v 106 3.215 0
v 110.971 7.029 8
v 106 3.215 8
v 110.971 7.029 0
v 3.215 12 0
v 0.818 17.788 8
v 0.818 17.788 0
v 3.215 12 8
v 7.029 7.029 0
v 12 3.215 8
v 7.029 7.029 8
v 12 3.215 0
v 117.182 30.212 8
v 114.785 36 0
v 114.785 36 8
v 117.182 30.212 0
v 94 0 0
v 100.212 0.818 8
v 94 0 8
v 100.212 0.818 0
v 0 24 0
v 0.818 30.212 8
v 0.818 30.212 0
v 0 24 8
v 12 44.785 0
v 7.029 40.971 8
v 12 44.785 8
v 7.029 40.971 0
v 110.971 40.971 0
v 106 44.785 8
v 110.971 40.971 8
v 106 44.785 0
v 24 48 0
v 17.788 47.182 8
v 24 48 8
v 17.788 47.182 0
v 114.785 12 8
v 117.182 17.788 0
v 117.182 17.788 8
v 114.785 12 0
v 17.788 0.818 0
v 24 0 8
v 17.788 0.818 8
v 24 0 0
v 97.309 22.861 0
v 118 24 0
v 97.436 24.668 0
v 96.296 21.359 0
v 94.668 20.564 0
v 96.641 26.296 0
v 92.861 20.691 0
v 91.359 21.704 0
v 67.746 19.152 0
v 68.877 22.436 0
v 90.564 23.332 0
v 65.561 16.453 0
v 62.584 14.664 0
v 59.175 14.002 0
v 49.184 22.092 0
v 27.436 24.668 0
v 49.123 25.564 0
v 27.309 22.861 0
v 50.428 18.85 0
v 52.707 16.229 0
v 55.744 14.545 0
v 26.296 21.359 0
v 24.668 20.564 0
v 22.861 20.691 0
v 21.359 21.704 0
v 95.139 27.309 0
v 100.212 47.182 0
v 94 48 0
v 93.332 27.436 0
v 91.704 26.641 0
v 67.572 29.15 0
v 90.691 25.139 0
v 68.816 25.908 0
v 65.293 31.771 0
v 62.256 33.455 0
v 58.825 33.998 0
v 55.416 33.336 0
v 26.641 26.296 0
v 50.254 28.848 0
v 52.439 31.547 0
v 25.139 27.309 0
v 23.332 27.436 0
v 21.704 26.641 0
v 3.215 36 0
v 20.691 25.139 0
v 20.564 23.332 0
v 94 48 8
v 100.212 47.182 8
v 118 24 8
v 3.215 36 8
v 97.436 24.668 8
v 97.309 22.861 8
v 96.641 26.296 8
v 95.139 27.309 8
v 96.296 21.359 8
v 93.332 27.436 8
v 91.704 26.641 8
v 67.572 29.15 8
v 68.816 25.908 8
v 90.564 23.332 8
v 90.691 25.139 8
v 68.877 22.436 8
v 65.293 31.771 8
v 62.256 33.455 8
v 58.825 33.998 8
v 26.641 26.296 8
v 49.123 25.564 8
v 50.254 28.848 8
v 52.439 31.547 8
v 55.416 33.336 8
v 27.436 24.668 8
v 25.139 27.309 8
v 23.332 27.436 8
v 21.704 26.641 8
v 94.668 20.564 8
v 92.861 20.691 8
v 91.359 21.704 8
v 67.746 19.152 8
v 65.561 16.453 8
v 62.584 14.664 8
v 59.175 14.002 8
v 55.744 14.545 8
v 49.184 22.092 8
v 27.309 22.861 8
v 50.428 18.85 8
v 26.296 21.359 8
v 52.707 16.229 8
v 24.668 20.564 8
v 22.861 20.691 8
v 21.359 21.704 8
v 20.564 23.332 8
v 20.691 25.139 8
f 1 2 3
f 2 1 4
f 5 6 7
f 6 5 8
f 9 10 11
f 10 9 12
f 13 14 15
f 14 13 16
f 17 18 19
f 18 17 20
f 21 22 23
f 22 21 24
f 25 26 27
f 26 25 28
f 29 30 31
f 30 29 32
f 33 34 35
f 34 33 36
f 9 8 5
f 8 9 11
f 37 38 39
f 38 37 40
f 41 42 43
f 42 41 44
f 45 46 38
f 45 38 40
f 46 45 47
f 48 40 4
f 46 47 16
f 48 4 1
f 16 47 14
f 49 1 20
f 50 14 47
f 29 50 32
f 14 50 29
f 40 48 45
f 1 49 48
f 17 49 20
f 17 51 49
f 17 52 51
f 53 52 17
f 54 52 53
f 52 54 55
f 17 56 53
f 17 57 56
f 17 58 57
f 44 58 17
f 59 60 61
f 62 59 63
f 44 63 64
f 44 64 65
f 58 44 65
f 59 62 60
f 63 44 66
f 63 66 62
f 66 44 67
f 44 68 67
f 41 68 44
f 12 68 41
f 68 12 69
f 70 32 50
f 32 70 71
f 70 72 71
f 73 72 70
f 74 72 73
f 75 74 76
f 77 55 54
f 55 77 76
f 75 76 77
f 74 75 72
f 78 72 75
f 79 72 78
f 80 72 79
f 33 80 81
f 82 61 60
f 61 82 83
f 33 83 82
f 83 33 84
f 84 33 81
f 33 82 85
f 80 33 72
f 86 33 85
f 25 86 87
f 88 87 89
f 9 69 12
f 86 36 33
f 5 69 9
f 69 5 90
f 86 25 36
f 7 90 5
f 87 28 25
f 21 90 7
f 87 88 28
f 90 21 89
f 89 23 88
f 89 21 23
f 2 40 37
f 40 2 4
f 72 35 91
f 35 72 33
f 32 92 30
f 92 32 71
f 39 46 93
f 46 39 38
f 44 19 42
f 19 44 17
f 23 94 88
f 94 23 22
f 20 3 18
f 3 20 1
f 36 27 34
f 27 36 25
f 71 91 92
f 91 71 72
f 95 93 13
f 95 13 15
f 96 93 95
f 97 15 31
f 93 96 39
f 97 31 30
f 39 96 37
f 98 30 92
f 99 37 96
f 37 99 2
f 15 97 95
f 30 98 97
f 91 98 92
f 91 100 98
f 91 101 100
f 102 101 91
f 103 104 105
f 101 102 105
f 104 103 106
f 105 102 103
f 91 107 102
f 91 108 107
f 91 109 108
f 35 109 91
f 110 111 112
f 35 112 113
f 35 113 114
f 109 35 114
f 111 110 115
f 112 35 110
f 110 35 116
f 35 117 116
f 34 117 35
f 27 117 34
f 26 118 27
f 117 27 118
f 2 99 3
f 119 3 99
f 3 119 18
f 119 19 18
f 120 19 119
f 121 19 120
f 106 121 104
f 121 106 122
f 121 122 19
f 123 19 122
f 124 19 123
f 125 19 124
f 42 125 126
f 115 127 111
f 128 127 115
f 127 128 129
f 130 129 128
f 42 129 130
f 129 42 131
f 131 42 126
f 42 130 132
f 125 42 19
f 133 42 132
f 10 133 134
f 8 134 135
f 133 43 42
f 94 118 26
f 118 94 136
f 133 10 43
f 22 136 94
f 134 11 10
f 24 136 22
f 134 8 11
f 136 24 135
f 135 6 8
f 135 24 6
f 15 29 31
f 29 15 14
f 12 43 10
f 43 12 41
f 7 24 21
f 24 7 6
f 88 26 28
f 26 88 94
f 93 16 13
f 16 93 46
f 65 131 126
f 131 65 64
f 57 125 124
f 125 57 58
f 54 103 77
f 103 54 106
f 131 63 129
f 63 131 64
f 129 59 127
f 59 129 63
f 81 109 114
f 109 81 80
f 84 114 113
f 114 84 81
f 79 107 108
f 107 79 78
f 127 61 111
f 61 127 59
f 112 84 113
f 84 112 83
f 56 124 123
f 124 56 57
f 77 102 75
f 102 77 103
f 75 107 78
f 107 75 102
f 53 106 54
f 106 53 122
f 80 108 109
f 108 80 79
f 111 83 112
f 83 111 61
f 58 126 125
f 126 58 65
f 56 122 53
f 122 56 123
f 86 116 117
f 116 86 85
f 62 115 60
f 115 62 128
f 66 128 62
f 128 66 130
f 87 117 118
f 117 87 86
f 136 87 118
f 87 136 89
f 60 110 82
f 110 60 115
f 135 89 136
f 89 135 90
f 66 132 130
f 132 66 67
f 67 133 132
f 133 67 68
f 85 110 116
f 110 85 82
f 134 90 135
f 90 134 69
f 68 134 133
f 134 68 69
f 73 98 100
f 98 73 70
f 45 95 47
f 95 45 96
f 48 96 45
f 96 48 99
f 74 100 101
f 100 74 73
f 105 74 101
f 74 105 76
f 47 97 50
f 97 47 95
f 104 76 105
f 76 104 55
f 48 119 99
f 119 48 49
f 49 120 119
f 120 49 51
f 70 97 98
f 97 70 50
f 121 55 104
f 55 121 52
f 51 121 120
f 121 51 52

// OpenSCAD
$fn = 32;

// ----------------------------------------------------------------------
// Spacer plate: obround span 70, caps R24
// ----------------------------------------------------------------------

// --- parameters (mm) ---
bore_r = 10;              // centre bore radius
bolt_r = 3.5;             // bolt hole radius
plate_t = 8;              // plate thickness, Z (extrusion height)
span = 70;                // obround span
cap_r = 24;               // cap radius
fit_tol = 0.1;            // declared fit tolerance (prompt contract)
free_tol = 0.3;           // declared free tolerance (prompt contract)

profile = [[24, 48], [17.788, 47.182], [12, 44.785], [7.029, 40.971], [3.215, 36], [0.818, 30.212], [0, 24], [0.818, 17.788], [3.215, 12], [7.029, 7.029], [12, 3.215], [17.788, 0.818], [24, 0], [94, 0], [100.212, 0.818], [106, 3.215], [110.971, 7.029], [114.785, 12], [117.182, 17.788], [118, 24], [117.182, 30.212], [114.785, 36], [110.971, 40.971], [106, 44.785], [100.212, 47.182], [94, 48]];  // primary outline, 26 points, counter clockwise
void_1 = [[68.816, 25.908], [67.572, 29.15], [65.293, 31.771], [62.256, 33.455], [58.825, 33.998], [55.416, 33.336], [52.439, 31.547], [50.254, 28.848], [49.123, 25.564], [49.184, 22.092], [50.428, 18.85], [52.707, 16.229], [55.744, 14.545], [59.175, 14.002], [62.584, 14.664], [65.561, 16.453], [67.746, 19.152], [68.877, 22.436]];  // centre bore, 18 points
void_2 = [[27.436, 24.668], [26.641, 26.296], [25.139, 27.309], [23.332, 27.436], [21.704, 26.641], [20.691, 25.139], [20.564, 23.332], [21.359, 21.704], [22.861, 20.691], [24.668, 20.564], [26.296, 21.359], [27.309, 22.861]];  // end hole, 12 points
void_3 = [[97.436, 24.668], [96.641, 26.296], [95.139, 27.309], [93.332, 27.436], [91.704, 26.641], [90.691, 25.139], [90.564, 23.332], [91.359, 21.704], [92.861, 20.691], [94.668, 20.564], [96.296, 21.359], [97.309, 22.861]];  // end hole, 12 points

// --- the one profile operation ---
difference() {
  linear_extrude(height = plate_t) polygon(points = profile);
  translate([0, 0, -1])
    linear_extrude(height = plate_t + 2) polygon(points = void_1);
  translate([0, 0, -1])
    linear_extrude(height = plate_t + 2) polygon(points = void_2);
  translate([0, 0, -1])
    linear_extrude(height = plate_t + 2) polygon(points = void_3);
}
